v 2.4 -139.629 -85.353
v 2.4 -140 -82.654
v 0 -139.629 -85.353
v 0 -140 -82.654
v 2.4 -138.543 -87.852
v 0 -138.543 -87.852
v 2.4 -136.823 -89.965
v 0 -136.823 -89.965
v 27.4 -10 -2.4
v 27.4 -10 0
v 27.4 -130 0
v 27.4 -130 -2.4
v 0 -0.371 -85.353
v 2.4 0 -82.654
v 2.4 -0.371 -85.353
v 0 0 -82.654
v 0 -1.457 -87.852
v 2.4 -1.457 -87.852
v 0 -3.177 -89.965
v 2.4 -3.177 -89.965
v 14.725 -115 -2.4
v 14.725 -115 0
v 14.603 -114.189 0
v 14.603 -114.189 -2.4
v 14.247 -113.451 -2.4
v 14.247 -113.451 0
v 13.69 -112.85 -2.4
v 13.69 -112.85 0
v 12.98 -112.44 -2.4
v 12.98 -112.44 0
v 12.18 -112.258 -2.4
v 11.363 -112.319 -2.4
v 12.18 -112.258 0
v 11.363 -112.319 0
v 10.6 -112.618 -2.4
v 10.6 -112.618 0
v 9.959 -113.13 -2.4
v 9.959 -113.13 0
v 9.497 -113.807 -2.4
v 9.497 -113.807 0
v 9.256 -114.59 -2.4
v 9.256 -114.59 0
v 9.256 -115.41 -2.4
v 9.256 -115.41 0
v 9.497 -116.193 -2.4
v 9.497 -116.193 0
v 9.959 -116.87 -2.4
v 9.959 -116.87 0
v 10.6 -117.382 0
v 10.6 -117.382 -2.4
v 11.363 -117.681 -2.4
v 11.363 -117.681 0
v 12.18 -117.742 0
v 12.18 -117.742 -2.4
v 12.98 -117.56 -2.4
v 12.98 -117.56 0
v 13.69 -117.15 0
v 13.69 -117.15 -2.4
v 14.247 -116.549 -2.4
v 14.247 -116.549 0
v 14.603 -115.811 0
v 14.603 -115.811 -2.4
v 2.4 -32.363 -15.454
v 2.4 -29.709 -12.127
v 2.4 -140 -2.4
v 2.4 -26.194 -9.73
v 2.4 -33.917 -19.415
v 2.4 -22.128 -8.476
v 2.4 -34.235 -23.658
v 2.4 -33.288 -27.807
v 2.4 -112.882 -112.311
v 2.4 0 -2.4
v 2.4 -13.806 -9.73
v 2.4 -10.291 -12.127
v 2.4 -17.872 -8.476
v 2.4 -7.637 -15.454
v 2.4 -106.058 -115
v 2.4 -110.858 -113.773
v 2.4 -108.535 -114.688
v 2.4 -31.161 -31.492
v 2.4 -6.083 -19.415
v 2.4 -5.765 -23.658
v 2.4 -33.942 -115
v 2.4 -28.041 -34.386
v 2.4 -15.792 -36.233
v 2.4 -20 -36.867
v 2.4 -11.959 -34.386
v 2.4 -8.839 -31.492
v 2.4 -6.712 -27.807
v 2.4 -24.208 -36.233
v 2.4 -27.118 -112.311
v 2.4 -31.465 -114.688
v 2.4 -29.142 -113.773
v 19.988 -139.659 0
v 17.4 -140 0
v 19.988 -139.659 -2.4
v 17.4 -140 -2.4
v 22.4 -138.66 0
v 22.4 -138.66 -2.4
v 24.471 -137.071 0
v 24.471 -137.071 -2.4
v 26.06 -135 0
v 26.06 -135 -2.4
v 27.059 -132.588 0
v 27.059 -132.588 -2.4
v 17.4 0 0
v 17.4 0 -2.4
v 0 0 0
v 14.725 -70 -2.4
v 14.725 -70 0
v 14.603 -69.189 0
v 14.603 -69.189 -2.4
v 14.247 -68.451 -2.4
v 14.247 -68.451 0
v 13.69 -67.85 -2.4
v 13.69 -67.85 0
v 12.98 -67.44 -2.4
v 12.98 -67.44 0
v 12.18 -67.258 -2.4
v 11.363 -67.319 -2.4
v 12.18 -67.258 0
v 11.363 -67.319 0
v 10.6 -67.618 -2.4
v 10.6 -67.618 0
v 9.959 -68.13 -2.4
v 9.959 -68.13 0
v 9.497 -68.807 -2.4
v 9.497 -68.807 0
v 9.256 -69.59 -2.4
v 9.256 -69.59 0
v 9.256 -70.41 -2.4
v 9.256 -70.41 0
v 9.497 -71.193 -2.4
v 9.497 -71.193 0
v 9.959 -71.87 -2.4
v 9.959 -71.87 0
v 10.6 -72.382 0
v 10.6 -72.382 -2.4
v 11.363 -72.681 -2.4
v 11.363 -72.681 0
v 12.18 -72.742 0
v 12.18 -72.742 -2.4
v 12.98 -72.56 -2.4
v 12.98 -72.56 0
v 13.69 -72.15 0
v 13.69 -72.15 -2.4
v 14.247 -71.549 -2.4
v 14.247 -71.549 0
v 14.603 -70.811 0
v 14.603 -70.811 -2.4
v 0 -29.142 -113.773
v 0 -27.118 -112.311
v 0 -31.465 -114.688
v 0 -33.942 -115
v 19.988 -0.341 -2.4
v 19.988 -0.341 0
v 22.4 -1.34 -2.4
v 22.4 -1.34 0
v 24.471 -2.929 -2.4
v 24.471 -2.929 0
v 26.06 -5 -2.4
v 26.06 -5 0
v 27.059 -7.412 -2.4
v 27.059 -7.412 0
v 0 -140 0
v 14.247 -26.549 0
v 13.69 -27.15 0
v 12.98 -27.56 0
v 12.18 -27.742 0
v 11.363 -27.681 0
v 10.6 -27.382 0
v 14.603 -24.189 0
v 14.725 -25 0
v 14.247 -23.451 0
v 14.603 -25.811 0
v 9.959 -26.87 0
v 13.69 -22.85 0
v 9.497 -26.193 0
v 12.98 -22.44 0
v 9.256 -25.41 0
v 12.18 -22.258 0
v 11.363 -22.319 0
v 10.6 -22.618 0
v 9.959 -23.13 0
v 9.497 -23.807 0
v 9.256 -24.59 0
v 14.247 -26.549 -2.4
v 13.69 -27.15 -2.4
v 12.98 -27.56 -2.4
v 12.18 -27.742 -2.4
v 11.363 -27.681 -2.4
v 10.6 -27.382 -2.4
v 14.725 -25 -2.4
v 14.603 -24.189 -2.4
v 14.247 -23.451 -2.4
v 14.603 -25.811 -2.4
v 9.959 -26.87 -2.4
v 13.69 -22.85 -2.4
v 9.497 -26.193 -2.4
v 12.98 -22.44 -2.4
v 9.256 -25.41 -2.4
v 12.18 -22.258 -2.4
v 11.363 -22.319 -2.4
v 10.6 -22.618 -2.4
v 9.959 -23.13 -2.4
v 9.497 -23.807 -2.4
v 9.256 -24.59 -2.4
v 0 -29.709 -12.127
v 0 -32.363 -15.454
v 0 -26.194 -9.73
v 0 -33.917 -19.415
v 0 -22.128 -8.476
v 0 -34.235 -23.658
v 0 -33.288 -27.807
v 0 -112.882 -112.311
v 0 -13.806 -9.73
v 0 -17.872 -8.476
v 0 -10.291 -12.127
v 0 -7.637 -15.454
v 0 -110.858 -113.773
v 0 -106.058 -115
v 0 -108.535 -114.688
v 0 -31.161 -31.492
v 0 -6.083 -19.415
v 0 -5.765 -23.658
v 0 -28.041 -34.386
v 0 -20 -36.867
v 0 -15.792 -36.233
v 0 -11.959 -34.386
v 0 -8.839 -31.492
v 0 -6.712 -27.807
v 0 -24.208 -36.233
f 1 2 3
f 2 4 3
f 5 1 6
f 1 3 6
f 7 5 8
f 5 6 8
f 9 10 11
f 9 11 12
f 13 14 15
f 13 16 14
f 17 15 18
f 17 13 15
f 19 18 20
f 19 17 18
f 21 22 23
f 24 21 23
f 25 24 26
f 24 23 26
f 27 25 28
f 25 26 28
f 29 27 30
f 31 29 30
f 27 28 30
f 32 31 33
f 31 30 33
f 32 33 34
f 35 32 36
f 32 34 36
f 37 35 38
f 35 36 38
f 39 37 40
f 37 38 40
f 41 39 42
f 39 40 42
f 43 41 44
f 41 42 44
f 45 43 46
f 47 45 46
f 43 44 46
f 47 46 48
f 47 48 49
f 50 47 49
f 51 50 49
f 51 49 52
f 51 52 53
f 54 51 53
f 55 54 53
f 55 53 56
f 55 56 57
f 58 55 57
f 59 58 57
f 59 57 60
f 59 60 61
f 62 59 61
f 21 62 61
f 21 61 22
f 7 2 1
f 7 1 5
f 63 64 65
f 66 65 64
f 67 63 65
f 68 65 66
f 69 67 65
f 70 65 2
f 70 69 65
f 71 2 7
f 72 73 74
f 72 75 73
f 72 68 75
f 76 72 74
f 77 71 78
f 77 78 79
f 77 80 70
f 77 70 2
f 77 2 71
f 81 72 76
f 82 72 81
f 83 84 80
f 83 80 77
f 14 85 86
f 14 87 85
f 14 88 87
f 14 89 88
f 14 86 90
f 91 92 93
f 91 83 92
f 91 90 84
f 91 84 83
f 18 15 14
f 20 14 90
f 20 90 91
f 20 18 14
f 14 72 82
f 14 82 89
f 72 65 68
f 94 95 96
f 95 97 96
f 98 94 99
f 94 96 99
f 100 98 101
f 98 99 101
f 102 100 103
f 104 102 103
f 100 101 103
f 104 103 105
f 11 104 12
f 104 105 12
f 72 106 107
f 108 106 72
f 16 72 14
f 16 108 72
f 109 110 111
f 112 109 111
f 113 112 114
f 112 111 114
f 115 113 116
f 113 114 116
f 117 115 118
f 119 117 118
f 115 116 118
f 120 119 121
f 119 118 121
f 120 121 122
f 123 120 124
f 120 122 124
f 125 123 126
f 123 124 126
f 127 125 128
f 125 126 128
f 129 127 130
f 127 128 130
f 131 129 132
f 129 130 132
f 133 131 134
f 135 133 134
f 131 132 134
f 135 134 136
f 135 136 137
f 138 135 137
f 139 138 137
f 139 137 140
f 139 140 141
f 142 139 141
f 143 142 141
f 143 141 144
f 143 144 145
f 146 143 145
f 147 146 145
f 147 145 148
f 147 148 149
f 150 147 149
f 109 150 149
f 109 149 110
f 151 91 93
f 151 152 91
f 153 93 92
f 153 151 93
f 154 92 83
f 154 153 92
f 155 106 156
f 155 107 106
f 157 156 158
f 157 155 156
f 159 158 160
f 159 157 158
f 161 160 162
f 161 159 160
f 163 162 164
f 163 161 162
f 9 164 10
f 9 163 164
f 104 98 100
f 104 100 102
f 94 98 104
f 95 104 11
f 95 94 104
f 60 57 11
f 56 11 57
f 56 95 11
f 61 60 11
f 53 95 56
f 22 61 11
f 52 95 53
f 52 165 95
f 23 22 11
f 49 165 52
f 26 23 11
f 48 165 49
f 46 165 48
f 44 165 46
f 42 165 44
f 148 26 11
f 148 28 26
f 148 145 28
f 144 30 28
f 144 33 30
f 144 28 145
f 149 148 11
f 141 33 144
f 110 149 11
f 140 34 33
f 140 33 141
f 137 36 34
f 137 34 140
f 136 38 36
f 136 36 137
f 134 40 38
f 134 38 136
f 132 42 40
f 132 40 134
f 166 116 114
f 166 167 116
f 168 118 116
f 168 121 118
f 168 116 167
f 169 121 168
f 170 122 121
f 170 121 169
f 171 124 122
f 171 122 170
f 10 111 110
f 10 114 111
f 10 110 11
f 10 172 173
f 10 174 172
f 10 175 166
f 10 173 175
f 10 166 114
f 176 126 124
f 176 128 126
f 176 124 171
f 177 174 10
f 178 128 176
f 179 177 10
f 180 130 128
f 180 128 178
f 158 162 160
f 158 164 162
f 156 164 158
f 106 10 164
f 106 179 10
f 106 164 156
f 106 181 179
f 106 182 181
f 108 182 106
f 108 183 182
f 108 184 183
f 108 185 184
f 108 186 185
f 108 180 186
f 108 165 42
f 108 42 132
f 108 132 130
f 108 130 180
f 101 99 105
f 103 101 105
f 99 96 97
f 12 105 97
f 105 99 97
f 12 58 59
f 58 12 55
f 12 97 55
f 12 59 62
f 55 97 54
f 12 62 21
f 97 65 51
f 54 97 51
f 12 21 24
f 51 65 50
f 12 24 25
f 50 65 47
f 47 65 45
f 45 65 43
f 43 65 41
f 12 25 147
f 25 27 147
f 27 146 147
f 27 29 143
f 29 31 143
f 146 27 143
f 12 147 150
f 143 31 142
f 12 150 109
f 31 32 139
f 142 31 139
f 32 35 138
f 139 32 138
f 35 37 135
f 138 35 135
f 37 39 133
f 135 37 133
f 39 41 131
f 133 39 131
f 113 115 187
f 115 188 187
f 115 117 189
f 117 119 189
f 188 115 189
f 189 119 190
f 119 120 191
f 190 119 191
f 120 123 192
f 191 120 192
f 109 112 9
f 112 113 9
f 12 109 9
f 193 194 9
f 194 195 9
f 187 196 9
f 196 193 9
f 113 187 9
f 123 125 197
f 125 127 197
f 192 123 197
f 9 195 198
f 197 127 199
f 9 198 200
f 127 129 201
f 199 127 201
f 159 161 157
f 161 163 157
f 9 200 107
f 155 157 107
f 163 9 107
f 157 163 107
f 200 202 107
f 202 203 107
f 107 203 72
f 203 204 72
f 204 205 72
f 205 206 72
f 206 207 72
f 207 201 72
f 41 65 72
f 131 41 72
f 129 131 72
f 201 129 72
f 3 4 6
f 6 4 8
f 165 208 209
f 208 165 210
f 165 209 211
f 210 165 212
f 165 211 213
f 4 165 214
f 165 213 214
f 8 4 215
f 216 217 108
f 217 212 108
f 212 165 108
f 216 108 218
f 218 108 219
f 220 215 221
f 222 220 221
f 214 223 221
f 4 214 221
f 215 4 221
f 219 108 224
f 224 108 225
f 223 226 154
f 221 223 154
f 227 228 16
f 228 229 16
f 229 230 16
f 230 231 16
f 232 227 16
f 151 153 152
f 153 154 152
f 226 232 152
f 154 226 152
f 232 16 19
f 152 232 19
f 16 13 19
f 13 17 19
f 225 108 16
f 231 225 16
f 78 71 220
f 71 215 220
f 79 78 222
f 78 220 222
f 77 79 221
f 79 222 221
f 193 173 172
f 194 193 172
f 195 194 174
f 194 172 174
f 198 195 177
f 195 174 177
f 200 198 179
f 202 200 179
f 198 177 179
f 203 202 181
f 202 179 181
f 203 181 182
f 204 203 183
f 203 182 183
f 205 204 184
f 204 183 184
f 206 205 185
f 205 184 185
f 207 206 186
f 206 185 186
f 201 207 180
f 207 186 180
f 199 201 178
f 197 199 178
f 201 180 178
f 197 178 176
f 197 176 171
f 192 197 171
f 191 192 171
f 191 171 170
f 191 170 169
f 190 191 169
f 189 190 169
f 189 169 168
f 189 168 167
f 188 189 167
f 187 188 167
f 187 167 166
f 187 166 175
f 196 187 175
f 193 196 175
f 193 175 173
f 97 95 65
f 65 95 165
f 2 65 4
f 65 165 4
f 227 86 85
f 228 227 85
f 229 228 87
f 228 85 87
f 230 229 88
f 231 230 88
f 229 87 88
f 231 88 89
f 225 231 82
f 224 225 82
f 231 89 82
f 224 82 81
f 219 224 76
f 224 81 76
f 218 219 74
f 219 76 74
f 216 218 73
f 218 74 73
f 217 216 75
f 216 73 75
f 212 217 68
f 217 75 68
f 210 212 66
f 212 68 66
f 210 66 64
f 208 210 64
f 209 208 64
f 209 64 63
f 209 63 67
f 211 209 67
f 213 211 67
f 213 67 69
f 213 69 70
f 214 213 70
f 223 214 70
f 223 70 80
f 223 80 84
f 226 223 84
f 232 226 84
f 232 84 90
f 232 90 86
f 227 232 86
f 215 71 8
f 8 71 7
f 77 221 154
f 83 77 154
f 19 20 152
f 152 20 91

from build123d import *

# Parameters (mm, degrees)
SKETCH1_W           = 115
SKETCH1_H           = 140
BOSS_EXTRUDE1_DEPTH = 2.4
CUT_EXTRUDE1_DEPTH  = 3.4
FILLET1_R           = 10
SKETCH3_W           = 2.4
SKETCH3_H           = 140
BOSS_EXTRUDE2_DEPTH = 25
FILLET2_R           = 10
SKETCH4_R           = 2.75
CUT_EXTRUDE2_DEPTH  = 116
SKETCH5_R           = 14.275
CUT_EXTRUDE3_DEPTH  = 3.4


with BuildPart() as part:
    # Sketch1 → Boss-Extrude1 (new body)
    with BuildSketch(Plane(origin=(0, 0, 0), x_dir=(0, 0, -1), z_dir=(1, 0, 0))):
        with Locations((57.5, -70)):
            Rectangle(SKETCH1_W, SKETCH1_H)
    extrude(amount=BOSS_EXTRUDE1_DEPTH)

    # Sketch2 → Cut-Extrude1 (cut, through all)
    with BuildSketch(Plane(origin=(2.4, 0, 0), x_dir=(0, 0, -1), z_dir=(1, 0, 0))):
        Polygon((87, 0), (115, -30), (142.616199658, -32.505405645), (142.616199658, 14.875556406), align=None)
        Polygon((115, -110), (87, -140), (87, -152.661109726), (136.310004643, -152.661109726), align=None)
    extrude(amount=-CUT_EXTRUDE1_DEPTH, mode=Mode.SUBTRACT)

    # Fillet1
    fillet1_edges = [part.edges().sort_by_distance(p)[0] for p in [
        (1.2, 0, -87),
        (1.2, -30, -115),
        (1.2, -110, -115),
        (1.2, -140, -87),
    ]]
    fillet(fillet1_edges, radius=FILLET1_R)

    # Sketch3 → Boss-Extrude2 (add)
    with BuildSketch(Plane(origin=(2.4, 0, 0), x_dir=(0, 0, -1), z_dir=(1, 0, 0))):
        with Locations((1.2, -70)):
            Rectangle(SKETCH3_W, SKETCH3_H)
    extrude(amount=BOSS_EXTRUDE2_DEPTH)

    # Fillet2
    fillet2_edges = [part.edges().sort_by_distance(p)[0] for p in [
        (27.4, -140, -1.2),
        (27.4, 0, -1.2),
    ]]
    fillet(fillet2_edges, radius=FILLET2_R)

    # Sketch4 → Cut-Extrude2 (cut, through all)
    with BuildSketch(Plane.XY):
        with Locations((11.974983581, -70)):
            Circle(SKETCH4_R)
        with Locations((11.974983581, -25)):
            Circle(SKETCH4_R)
        with Locations((11.974983581, -115)):
            Circle(SKETCH4_R)
    extrude(amount=-CUT_EXTRUDE2_DEPTH, mode=Mode.SUBTRACT)

    # Sketch5 → Cut-Extrude3 (cut, through all)
    with BuildSketch(Plane(origin=(2.4, 0, 0), x_dir=(0, 0, -1), z_dir=(1, 0, 0))):
        with Locations((22.591699334, -20)):
            Circle(SKETCH5_R)
    extrude(amount=-CUT_EXTRUDE3_DEPTH, mode=Mode.SUBTRACT)


solid = part.part
